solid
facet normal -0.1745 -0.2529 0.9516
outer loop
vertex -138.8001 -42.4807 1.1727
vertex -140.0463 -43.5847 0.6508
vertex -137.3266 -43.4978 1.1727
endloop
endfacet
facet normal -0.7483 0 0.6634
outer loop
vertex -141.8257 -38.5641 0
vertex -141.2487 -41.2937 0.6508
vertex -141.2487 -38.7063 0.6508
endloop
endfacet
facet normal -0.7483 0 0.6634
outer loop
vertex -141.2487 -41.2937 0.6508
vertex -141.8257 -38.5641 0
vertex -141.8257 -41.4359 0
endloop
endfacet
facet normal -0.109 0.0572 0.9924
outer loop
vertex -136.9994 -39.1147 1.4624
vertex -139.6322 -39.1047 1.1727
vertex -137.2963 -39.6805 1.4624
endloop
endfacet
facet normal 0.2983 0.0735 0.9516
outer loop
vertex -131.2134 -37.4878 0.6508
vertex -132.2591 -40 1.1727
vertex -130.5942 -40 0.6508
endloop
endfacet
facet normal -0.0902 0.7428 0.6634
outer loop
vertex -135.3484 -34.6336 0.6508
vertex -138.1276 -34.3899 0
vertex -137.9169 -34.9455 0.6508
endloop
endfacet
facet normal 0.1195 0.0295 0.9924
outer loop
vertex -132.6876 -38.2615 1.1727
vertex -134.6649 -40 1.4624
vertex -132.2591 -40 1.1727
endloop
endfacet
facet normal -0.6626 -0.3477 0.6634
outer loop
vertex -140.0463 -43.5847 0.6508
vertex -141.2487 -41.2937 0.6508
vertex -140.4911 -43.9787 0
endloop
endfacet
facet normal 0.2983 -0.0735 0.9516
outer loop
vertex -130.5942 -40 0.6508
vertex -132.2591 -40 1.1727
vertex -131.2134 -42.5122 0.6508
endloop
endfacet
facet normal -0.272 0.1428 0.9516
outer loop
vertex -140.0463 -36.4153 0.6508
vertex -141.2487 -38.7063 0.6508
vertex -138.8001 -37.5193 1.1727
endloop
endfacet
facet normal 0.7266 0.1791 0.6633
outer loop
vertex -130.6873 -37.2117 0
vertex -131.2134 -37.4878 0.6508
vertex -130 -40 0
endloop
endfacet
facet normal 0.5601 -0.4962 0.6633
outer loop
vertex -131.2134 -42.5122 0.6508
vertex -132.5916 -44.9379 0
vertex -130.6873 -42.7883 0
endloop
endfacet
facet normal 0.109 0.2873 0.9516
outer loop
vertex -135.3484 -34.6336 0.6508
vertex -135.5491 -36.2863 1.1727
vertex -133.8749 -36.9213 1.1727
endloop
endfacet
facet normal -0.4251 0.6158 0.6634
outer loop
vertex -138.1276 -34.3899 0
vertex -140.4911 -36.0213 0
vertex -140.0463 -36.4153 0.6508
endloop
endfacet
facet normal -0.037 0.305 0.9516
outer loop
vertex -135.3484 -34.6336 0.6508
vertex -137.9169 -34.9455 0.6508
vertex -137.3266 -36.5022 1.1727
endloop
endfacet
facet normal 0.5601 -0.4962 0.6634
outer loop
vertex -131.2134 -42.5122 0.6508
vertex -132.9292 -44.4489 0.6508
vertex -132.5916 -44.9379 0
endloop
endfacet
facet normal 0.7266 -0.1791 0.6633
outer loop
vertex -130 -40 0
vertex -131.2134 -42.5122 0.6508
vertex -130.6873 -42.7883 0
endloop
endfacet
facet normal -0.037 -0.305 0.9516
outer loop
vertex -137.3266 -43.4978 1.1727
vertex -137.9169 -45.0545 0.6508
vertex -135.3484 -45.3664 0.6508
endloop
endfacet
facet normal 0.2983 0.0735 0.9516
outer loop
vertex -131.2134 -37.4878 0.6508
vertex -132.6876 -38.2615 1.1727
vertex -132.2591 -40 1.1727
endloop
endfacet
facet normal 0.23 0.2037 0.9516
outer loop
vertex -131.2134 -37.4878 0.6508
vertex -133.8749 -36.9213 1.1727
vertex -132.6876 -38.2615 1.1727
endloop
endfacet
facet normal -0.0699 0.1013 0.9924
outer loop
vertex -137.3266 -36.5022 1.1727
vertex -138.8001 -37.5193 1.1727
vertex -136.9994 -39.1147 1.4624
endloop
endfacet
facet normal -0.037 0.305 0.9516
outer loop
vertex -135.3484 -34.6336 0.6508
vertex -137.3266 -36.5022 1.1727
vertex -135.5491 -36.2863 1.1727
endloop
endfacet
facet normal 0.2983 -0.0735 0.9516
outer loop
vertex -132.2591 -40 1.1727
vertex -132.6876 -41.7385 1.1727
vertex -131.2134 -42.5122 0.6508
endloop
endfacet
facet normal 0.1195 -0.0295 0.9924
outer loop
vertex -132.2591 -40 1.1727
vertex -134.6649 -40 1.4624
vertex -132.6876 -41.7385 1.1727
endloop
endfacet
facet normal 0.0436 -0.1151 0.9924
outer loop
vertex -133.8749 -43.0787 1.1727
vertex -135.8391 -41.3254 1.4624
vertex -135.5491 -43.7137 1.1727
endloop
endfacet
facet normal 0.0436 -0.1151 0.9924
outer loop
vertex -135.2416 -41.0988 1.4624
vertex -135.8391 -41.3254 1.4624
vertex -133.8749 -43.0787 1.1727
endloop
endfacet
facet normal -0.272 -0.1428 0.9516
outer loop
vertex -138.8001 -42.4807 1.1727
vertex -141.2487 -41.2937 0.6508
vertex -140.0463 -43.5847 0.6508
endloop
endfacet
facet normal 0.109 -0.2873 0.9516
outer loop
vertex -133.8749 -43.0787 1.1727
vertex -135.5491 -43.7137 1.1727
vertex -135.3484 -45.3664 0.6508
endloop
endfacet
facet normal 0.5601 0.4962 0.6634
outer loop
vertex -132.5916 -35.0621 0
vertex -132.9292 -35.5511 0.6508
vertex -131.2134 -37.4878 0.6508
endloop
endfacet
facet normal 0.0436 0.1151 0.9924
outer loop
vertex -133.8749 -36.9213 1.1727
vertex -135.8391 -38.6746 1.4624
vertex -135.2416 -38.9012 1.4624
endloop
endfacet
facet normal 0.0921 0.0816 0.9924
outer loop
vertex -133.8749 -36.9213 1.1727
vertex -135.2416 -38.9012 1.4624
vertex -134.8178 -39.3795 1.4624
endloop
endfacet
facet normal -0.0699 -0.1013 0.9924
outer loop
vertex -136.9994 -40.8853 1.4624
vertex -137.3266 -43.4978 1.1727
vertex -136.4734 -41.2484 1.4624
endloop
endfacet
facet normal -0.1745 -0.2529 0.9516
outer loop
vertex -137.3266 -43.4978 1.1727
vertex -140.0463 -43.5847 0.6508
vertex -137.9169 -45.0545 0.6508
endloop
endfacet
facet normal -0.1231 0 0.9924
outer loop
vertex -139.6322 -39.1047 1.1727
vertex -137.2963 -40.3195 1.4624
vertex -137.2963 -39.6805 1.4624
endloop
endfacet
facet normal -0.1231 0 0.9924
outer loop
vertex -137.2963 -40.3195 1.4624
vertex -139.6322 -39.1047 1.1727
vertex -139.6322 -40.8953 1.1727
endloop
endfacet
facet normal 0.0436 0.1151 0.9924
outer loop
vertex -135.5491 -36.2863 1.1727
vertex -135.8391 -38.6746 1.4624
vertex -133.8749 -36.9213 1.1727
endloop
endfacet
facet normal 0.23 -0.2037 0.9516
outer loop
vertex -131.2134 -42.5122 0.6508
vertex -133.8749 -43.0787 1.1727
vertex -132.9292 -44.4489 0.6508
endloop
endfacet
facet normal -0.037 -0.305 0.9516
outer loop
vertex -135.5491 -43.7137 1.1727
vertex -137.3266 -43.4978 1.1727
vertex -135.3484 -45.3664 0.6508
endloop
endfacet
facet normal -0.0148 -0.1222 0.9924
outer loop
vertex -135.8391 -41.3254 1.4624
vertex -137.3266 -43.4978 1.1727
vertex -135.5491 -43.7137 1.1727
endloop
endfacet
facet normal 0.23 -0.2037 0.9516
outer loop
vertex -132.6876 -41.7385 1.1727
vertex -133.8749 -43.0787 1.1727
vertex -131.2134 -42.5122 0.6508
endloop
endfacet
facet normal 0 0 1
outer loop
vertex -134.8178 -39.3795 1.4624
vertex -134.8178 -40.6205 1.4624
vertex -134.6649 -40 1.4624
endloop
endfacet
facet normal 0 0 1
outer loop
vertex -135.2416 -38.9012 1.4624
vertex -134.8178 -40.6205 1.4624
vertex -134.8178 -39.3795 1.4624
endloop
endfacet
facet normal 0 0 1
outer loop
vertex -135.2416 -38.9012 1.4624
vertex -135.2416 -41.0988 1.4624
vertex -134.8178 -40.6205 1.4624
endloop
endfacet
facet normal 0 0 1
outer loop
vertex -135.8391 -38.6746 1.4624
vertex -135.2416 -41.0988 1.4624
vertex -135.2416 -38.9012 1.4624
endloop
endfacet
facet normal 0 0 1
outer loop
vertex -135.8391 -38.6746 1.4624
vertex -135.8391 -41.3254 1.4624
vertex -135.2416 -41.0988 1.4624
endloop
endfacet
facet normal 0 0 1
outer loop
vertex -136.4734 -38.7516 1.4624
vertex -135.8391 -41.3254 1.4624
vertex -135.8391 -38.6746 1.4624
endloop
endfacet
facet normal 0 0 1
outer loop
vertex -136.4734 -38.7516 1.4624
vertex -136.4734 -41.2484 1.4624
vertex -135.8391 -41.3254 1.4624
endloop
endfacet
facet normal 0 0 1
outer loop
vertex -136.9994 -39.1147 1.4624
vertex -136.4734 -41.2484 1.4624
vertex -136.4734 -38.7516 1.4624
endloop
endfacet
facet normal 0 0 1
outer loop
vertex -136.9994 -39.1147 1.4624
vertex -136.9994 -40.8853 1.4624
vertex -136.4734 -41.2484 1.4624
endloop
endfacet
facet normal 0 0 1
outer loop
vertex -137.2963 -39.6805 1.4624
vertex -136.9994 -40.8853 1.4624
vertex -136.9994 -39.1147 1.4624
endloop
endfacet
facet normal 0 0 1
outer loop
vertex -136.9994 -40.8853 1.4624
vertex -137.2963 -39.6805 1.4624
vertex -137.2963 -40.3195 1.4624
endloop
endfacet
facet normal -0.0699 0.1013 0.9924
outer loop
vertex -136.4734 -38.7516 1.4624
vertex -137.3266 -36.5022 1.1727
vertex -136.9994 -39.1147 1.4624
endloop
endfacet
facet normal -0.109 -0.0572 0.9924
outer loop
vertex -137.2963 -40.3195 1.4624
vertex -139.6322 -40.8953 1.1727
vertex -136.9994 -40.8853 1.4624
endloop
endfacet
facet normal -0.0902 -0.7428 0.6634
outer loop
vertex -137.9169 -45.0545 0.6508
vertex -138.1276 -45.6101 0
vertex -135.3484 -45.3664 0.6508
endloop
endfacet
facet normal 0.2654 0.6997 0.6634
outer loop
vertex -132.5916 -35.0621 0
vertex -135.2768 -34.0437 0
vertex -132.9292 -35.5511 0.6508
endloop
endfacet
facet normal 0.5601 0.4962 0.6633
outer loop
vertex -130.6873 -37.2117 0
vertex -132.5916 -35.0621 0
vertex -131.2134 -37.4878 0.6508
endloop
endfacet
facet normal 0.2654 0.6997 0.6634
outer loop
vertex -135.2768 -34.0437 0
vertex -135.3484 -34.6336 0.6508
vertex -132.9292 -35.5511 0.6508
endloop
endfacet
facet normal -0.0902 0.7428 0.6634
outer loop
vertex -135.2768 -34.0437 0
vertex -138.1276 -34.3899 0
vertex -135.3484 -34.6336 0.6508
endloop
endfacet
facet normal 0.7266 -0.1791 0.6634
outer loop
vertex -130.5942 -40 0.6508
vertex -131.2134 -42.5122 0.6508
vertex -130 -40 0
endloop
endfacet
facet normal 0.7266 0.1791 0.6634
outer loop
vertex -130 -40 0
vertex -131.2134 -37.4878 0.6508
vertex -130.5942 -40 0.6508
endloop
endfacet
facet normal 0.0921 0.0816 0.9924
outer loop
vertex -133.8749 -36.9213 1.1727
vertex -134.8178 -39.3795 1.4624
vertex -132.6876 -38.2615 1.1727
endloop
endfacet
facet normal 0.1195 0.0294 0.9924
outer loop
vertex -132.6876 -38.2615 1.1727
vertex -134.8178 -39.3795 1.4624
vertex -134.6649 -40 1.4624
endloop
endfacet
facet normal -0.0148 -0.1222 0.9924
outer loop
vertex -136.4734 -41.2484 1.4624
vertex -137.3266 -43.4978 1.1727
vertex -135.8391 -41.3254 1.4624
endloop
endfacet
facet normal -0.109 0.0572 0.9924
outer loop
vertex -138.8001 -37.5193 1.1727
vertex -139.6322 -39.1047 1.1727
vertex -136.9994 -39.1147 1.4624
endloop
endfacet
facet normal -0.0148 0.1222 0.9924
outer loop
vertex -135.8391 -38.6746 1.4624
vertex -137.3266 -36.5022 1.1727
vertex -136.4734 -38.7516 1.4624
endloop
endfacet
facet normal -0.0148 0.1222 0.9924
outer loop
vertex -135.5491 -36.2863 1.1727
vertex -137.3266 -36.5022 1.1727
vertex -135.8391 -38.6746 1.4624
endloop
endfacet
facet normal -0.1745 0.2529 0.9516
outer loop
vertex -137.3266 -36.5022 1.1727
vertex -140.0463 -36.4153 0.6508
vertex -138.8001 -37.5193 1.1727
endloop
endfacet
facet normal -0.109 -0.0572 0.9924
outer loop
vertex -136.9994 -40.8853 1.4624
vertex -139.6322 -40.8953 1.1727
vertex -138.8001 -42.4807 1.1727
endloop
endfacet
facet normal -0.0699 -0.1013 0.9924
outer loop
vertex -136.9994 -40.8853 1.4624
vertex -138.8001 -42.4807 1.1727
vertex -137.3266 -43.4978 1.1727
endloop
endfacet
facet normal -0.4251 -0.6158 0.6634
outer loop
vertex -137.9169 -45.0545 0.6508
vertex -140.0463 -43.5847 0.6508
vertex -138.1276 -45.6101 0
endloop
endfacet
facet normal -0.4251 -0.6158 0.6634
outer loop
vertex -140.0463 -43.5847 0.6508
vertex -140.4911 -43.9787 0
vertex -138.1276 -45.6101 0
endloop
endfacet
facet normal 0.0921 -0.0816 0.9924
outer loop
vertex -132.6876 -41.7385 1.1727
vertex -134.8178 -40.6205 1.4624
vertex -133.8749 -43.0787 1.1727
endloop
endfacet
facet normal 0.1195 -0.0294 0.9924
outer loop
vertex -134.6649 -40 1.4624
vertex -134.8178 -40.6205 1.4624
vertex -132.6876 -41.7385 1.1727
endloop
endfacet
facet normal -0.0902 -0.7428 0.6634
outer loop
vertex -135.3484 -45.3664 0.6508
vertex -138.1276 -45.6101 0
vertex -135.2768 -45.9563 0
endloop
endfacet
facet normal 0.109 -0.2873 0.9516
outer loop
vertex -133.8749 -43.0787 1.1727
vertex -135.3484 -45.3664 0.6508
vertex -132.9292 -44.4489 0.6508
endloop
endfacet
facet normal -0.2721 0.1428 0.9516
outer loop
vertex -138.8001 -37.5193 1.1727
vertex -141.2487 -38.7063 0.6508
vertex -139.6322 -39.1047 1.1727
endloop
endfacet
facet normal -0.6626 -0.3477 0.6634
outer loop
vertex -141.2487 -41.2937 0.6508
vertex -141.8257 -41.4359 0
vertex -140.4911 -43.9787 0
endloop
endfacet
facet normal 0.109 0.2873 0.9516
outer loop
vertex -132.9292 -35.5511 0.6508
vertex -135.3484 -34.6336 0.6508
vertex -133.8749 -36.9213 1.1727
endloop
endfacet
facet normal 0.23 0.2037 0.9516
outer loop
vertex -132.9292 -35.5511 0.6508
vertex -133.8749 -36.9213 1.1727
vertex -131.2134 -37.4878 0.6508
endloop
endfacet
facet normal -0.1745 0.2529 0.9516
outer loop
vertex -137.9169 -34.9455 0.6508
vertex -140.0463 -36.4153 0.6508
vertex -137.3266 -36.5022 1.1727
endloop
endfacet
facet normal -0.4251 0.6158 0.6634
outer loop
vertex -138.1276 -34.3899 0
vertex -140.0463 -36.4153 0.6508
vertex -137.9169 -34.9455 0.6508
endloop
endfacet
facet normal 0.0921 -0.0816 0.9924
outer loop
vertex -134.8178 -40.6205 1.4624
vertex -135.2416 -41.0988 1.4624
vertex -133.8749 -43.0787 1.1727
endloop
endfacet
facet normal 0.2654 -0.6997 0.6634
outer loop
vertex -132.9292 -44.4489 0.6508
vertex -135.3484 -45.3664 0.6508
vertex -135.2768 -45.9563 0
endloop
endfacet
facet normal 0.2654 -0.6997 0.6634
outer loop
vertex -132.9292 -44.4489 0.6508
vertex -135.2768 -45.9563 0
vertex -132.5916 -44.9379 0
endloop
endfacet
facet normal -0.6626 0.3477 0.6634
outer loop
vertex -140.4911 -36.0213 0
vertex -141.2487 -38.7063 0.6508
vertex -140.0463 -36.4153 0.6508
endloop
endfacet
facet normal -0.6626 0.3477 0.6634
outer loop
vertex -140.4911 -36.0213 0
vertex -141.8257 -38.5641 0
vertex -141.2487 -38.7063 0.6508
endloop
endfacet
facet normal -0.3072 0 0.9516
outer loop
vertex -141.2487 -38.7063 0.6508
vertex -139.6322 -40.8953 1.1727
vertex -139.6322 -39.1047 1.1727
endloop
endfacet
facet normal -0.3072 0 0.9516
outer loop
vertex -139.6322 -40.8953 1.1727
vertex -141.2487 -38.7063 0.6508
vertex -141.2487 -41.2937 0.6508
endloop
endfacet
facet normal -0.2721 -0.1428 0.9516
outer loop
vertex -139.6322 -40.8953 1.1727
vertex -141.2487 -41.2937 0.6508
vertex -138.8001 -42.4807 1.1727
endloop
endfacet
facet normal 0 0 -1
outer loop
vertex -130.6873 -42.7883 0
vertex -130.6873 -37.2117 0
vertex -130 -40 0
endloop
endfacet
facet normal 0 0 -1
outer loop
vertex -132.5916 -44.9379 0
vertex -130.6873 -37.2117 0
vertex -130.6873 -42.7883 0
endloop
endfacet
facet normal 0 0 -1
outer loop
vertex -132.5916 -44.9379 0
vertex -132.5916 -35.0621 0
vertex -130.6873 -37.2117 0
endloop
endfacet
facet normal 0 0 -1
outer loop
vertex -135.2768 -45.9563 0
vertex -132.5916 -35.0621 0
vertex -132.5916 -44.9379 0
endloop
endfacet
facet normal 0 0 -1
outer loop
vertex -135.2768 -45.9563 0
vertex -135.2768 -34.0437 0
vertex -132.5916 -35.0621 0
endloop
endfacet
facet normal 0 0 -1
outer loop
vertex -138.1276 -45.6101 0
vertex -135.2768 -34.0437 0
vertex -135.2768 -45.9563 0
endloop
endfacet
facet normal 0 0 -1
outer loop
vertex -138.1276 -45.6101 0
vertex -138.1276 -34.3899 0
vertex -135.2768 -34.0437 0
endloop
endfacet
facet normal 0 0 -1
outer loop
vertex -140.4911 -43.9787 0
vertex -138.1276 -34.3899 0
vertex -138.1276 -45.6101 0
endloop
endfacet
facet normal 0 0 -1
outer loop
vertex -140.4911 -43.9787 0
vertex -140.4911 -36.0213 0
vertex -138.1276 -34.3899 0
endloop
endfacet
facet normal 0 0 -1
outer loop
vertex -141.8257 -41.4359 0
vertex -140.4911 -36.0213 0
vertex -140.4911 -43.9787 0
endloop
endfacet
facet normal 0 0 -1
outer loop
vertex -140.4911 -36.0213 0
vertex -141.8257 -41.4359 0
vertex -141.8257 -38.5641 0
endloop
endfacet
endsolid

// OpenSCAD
difference() {
	scale([4,4])
	translate([-34,-10,0]) minkowski() {
		linear_extrude(height=0.1)
			import("shrunk.dxf");
		difference() {
			sphere(r=1.5,$fn=13);
			translate([-3,-3,-6]) cube([6,6,6]);
		}
	}
	translate([0,0,0.3])  cylinder(1.75,6.5,6.5);
	translate([0,0,-0.1]) cylinder(1.75,0.5,0.5);
}
